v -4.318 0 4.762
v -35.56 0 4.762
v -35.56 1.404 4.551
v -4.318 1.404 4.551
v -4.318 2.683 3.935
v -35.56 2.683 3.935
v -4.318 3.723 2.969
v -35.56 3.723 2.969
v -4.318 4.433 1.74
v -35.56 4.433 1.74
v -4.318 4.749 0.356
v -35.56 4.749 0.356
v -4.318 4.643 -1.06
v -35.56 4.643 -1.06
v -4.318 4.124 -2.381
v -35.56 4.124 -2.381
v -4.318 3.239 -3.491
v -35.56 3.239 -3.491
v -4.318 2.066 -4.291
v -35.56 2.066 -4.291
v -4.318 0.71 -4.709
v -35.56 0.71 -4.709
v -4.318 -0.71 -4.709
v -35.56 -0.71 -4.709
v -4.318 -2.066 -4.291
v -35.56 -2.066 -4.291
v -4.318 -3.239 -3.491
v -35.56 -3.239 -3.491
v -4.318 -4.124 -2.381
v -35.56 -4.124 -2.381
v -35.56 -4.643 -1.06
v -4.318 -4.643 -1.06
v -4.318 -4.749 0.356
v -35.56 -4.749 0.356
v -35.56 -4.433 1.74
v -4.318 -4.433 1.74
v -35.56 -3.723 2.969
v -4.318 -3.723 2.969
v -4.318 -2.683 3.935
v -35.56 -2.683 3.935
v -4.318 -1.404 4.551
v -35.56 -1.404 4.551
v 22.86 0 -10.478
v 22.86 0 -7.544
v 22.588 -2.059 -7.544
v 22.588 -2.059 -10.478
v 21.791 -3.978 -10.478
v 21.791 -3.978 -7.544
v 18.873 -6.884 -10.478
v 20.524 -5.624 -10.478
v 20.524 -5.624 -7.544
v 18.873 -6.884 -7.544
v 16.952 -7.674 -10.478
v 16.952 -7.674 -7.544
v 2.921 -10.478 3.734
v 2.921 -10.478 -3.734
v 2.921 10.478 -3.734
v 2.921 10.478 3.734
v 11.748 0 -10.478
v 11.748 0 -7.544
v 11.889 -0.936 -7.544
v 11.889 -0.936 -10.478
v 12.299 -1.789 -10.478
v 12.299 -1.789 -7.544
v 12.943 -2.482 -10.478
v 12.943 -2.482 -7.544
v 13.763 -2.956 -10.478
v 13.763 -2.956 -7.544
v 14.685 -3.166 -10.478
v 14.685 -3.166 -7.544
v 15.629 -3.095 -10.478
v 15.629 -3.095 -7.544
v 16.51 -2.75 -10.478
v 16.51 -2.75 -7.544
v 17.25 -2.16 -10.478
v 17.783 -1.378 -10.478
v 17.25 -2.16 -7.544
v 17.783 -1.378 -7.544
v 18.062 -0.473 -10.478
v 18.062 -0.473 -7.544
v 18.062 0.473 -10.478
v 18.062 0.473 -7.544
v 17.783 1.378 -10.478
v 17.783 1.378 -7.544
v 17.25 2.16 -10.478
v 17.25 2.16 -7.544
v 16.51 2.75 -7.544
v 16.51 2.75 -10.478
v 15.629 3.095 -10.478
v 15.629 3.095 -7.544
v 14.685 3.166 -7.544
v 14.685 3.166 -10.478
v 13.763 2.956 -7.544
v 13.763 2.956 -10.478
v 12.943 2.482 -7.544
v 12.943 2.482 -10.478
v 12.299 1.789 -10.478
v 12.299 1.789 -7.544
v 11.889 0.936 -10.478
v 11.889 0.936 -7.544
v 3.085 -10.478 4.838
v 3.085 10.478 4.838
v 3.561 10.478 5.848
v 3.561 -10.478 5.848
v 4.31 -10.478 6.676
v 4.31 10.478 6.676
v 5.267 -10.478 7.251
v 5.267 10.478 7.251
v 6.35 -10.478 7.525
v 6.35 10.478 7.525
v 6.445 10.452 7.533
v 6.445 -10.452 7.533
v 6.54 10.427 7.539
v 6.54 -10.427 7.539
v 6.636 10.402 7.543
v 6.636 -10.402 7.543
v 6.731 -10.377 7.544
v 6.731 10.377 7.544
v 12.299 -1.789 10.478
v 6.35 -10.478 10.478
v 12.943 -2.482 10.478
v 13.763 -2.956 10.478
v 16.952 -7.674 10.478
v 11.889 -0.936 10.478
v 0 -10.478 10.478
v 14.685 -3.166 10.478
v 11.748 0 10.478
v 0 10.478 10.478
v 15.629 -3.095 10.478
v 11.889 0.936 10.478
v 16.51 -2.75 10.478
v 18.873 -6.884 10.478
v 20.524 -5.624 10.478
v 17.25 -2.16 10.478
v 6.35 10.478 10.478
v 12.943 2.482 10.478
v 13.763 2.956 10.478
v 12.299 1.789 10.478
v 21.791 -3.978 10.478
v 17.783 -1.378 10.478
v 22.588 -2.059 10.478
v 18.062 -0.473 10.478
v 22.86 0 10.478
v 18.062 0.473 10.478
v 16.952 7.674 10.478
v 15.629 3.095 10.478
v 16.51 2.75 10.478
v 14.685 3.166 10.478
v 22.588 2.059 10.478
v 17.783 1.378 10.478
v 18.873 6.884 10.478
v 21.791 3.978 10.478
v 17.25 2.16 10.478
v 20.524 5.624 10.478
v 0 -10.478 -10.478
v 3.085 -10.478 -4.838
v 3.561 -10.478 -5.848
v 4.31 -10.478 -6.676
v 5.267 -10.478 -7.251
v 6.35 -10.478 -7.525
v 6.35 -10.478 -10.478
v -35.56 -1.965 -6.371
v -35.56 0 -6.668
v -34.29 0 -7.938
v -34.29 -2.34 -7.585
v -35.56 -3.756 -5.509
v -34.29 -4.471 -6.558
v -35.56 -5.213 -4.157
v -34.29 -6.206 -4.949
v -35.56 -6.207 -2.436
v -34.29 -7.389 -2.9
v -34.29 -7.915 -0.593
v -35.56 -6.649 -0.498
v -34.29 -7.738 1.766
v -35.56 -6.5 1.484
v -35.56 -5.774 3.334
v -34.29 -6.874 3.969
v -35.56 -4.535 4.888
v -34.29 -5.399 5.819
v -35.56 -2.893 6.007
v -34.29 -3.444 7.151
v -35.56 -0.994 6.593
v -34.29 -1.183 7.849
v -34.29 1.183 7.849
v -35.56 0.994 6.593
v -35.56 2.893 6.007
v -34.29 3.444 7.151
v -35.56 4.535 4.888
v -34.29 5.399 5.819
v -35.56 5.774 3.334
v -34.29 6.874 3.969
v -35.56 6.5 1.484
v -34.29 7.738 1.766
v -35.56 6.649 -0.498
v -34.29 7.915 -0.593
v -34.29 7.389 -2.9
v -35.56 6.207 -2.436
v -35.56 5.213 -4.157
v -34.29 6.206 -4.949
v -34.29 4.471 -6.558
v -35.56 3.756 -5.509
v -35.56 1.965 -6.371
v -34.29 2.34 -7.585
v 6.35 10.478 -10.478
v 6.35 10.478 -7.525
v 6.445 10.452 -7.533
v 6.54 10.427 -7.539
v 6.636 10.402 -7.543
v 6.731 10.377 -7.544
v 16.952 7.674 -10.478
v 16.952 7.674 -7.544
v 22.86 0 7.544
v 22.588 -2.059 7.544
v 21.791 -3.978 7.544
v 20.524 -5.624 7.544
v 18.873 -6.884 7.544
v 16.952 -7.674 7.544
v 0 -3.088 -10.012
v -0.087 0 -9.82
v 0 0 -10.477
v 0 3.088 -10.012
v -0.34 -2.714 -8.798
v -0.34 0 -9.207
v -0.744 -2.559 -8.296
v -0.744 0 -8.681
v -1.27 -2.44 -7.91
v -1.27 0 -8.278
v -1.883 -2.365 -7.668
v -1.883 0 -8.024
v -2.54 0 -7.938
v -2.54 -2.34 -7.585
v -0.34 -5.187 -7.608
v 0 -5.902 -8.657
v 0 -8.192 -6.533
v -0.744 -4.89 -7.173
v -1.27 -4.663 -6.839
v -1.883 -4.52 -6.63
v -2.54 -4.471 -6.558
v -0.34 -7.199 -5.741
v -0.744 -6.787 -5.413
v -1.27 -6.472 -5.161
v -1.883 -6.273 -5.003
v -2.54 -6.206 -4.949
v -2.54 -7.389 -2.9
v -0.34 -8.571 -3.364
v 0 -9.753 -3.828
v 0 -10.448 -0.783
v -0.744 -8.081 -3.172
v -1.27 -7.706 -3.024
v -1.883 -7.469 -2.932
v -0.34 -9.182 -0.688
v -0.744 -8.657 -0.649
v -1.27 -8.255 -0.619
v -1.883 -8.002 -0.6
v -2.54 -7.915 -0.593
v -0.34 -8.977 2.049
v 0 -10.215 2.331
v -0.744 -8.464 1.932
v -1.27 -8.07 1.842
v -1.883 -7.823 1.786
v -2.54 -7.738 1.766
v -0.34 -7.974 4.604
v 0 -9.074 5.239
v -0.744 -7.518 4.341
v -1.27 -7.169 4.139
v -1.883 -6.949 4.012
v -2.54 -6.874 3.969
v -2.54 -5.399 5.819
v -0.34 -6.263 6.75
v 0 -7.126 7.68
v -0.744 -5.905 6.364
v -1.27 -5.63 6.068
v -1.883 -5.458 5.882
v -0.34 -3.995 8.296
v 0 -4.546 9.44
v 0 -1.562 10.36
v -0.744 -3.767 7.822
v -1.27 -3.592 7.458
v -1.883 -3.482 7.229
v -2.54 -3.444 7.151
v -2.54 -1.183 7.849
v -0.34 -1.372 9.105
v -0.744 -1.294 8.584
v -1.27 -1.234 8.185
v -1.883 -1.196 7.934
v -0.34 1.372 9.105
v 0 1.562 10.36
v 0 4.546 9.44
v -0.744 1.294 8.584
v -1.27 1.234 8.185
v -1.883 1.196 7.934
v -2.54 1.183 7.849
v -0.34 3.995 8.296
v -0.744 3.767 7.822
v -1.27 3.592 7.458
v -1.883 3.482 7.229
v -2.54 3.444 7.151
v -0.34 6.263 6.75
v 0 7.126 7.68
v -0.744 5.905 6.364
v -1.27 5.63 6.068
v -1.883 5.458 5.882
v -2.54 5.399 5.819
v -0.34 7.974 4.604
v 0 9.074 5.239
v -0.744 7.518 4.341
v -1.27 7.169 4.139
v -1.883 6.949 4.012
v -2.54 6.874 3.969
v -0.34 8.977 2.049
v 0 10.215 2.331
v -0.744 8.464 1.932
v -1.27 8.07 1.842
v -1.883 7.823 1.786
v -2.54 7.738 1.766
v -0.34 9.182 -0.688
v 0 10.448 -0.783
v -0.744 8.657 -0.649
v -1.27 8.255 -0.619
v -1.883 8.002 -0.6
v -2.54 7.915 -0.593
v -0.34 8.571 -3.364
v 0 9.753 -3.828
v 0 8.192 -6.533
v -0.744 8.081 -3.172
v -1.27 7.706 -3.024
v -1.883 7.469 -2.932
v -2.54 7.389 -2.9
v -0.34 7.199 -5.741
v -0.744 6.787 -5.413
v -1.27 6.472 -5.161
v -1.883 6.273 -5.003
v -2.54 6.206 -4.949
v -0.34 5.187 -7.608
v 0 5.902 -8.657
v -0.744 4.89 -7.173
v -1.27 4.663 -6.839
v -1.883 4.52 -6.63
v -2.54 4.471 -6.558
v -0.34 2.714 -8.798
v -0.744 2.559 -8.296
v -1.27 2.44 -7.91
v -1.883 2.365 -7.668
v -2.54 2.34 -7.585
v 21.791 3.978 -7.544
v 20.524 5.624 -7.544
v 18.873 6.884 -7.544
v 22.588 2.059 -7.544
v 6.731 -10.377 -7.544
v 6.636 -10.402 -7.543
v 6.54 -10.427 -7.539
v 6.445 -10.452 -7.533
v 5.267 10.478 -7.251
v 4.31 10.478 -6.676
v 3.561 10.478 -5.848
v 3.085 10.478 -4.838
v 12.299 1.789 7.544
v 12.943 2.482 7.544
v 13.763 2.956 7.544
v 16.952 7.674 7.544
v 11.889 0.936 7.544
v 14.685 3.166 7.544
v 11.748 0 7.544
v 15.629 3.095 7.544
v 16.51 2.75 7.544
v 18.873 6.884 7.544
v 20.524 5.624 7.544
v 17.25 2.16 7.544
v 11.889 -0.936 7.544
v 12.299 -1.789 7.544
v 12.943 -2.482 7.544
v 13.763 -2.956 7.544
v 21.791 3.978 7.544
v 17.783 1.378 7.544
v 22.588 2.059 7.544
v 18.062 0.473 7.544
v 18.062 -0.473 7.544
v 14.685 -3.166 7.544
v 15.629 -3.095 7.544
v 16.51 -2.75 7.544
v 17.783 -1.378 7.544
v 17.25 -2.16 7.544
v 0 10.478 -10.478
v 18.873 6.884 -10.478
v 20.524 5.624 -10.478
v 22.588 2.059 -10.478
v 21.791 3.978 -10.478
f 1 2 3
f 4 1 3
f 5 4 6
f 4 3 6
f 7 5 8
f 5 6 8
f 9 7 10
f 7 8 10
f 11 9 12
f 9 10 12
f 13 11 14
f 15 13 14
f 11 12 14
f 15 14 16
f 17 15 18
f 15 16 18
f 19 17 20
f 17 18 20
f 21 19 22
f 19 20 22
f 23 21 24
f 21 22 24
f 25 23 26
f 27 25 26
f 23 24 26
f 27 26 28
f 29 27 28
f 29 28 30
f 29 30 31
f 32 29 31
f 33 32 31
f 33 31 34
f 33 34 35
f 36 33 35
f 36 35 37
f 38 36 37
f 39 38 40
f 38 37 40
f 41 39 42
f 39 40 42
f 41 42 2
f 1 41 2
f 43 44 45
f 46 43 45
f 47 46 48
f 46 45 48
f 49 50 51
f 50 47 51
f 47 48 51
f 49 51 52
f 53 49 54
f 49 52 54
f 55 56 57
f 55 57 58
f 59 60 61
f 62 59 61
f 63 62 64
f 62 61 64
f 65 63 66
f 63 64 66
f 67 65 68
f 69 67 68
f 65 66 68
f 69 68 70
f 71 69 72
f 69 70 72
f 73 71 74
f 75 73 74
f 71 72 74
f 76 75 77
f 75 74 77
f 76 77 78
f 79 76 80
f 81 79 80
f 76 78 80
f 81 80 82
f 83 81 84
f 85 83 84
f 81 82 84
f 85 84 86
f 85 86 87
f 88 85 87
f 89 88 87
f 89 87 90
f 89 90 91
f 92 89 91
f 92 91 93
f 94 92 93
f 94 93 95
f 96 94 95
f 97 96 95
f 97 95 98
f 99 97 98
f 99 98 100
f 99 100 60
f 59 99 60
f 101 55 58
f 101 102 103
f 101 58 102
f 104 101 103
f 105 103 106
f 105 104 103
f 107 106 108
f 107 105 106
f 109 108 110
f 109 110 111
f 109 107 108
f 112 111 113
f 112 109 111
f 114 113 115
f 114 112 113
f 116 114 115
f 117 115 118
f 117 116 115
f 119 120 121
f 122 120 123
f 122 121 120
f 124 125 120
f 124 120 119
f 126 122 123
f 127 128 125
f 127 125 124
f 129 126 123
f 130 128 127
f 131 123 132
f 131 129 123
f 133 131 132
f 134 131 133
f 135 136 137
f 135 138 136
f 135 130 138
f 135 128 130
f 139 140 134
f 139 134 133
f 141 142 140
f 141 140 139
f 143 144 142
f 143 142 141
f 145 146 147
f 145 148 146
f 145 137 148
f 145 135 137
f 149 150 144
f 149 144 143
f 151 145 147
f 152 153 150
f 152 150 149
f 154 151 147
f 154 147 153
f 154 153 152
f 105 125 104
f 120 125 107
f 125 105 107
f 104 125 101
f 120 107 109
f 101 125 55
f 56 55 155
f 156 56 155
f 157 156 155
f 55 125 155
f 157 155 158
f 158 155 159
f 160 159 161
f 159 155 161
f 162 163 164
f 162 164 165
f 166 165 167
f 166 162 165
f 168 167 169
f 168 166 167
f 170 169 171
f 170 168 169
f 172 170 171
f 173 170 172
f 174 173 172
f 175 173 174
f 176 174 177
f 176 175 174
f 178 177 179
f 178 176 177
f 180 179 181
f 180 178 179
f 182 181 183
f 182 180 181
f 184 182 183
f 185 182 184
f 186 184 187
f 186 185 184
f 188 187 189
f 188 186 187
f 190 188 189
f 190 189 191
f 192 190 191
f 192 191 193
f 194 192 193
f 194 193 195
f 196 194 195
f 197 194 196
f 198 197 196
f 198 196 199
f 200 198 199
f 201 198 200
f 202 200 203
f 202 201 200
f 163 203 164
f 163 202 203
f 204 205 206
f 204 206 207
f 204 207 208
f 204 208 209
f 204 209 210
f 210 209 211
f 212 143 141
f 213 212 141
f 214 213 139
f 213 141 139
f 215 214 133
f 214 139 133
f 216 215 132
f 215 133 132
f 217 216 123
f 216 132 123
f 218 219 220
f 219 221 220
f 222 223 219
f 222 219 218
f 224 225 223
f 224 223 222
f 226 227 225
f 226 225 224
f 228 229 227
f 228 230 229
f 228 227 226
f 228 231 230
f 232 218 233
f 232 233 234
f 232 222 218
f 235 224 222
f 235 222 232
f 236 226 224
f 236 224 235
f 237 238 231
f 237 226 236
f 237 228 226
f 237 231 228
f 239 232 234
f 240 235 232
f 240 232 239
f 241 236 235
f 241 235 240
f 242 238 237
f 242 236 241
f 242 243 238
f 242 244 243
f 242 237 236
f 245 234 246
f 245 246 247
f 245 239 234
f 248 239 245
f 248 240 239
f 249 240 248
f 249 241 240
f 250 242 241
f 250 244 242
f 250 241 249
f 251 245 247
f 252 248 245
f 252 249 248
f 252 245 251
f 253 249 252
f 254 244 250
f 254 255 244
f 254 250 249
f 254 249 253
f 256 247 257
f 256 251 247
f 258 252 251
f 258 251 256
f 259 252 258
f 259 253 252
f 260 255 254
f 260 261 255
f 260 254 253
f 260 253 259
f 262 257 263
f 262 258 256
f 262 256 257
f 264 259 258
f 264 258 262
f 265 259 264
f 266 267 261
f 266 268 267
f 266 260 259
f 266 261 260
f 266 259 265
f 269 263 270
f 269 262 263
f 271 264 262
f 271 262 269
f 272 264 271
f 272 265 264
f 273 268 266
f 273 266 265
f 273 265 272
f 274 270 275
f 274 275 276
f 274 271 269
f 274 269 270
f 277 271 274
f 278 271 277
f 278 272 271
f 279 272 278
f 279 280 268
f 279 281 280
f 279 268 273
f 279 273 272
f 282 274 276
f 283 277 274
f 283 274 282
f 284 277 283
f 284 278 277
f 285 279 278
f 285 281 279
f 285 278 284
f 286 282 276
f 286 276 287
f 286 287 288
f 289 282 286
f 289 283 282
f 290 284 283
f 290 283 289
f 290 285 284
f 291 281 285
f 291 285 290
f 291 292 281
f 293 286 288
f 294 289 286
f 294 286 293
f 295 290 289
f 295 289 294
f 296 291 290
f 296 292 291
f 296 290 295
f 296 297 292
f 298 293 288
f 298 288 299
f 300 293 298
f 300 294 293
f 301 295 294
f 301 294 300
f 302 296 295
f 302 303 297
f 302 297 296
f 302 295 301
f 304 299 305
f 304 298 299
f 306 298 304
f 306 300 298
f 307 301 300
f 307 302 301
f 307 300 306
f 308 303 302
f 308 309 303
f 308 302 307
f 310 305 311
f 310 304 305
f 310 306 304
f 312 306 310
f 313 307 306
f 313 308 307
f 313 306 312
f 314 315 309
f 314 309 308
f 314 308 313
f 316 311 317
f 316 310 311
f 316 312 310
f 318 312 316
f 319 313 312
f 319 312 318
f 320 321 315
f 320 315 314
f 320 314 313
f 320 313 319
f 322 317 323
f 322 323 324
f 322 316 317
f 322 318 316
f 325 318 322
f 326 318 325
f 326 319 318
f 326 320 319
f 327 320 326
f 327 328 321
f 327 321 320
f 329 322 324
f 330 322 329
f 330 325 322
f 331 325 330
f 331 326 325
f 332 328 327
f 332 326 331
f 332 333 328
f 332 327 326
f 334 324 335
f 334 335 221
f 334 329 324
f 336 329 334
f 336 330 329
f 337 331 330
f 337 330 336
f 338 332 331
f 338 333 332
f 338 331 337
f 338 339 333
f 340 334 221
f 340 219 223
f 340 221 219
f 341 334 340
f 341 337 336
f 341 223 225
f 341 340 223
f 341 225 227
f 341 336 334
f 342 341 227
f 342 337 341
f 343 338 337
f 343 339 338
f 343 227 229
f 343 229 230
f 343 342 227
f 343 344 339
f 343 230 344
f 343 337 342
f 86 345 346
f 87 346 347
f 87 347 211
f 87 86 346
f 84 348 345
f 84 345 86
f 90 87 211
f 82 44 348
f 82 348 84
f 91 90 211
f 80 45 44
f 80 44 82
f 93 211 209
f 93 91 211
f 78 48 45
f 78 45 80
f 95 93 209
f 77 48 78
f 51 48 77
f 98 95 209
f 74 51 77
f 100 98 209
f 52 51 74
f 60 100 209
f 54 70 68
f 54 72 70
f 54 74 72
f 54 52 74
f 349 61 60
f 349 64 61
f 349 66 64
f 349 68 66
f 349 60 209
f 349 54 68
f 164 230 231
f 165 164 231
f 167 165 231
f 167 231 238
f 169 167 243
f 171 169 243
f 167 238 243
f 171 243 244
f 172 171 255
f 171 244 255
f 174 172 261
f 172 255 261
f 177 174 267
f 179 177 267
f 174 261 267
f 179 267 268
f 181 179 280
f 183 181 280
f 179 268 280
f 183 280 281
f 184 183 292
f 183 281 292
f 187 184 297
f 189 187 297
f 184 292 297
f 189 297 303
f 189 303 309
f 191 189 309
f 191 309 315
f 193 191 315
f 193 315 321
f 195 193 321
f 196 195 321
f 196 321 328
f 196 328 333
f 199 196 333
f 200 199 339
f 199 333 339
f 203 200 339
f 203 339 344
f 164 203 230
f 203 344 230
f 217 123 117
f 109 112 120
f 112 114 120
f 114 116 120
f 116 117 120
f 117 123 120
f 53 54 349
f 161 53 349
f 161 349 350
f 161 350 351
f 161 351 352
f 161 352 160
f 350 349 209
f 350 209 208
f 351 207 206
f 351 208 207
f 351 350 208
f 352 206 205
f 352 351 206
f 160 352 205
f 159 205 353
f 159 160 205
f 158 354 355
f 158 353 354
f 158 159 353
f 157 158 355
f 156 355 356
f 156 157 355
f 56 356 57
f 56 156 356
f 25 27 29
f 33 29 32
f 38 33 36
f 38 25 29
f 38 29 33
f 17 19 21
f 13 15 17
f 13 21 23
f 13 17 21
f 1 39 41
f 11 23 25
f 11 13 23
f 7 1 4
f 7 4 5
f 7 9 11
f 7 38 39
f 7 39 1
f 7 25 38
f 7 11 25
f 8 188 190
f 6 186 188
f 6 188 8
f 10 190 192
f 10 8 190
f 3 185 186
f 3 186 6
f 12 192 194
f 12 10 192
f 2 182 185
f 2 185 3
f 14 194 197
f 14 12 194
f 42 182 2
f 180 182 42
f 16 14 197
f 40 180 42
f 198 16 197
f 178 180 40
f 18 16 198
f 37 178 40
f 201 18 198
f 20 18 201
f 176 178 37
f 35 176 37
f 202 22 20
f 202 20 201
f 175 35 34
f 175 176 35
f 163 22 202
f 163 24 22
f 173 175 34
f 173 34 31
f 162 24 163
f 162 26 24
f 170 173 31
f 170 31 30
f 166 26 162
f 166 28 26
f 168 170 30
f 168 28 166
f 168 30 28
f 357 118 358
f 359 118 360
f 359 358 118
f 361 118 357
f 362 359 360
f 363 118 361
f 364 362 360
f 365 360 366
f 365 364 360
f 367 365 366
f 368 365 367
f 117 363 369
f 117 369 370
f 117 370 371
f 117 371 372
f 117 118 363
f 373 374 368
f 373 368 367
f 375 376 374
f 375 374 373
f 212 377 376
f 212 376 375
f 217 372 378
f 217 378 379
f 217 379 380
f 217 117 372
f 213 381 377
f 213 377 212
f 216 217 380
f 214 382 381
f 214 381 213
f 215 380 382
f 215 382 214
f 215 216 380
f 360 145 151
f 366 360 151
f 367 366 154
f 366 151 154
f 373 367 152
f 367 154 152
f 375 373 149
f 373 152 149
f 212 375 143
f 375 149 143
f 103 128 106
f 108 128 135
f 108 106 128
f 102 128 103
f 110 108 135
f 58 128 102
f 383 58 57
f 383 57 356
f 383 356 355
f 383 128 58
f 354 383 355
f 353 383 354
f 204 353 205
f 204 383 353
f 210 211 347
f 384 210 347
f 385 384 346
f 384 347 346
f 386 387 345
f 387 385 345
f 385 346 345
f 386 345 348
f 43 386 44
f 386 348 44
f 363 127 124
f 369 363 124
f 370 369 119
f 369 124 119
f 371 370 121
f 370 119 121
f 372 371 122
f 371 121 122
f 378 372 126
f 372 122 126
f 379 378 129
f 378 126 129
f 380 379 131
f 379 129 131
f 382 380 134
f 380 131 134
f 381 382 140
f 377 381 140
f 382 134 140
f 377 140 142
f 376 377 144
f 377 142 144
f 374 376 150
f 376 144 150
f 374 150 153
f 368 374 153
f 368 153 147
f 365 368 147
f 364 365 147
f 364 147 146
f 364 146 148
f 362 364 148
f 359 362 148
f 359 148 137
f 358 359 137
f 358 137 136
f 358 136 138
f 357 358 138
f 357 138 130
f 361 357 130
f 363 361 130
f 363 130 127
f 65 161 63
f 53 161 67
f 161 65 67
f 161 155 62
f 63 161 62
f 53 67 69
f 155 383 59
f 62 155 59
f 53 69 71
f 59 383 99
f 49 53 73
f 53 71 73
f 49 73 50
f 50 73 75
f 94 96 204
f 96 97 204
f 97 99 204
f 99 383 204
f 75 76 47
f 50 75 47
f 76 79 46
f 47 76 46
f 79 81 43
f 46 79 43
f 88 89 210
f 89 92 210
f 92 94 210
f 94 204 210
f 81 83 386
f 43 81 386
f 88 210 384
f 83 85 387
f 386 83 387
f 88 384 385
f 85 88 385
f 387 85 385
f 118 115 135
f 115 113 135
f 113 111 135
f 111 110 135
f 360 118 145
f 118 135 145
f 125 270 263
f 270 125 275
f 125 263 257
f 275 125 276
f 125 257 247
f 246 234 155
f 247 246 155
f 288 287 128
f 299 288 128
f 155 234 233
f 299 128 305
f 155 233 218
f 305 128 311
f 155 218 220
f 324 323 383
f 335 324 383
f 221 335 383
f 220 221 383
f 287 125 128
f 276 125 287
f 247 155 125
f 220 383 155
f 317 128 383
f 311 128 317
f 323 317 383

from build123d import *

# Parameters (mm, degrees)
SKETCH1_W               = 22.86
SKETCH1_H               = 20.955
BOSS_EXTRUDE1_DEPTH     = 10.4775
CUT_EXTRUDE1_DEPTH      = 33.733310729
CUT_EXTRUDE1_DEPTH_BACK = 33.733310729
CUT_EXTRUDE2_DEPTH      = 33.733310729
SKETCH4_R               = 7.9375
BOSS_EXTRUDE2_DEPTH     = 35.56
SKETCH5_R               = 4.7625
CUT_EXTRUDE3_DEPTH      = 31.242
FILLET1_R               = 2.54
CHAMFER1_SIZE           = 1.27


with BuildPart() as part:
    # Sketch1 → Boss-Extrude1 (new, symmetric)
    with BuildSketch(Plane(origin=(0, 0, 0), x_dir=(1, 0, 0), z_dir=(0, 1, 0))):
        with Locations((11.43, 0)):
            Rectangle(SKETCH1_W, SKETCH1_H)
    extrude(amount=BOSS_EXTRUDE1_DEPTH, both=True)

    # Sketch2 → Cut-Extrude1 (cut, two sides: drawn at the far end of the back side and taken through both)
    with BuildSketch(Plane(origin=(0, 10.4775, 0), x_dir=(1, 0, 0), z_dir=(0, 1, 0)).offset(-CUT_EXTRUDE1_DEPTH_BACK)):
        with BuildLine():
            Line((2.921, 3.7338), (2.921, -3.7338))
            ThreePointArc((2.921, -3.7338), (4.036923164, -6.427876836), (6.731, -7.5438))
            Line((6.731, -7.5438), (22.86, -7.5438))
            Line((22.86, -7.5438), (22.86, 7.5438))
            Line((22.86, 7.5438), (6.731, 7.5438))
            ThreePointArc((6.731, 7.5438), (4.036923164, 6.427876836), (2.921, 3.7338))
        make_face()
    extrude(amount=CUT_EXTRUDE1_DEPTH + CUT_EXTRUDE1_DEPTH_BACK, mode=Mode.SUBTRACT)

    # Sketch3 → Cut-Extrude2 (cut, through all)
    with BuildSketch(Plane.XY.offset(10.4775)):
        with BuildLine():
            ThreePointArc((16.951908562, 7.673682763), (21.211869472, 4.842286433), (22.86, 0))
            Line((22.86, 0), (22.86, 10.4775))
            Line((22.86, 10.4775), (6.35, 10.4775))
            Line((6.35, 10.4775), (16.951908562, 7.673682763))
        make_face()
        with BuildLine():
            Line((22.86, -10.4775), (22.86, 0))
            ThreePointArc((22.86, 0), (21.211869472, -4.842286433), (16.951908562, -7.673682763))
            Line((16.951908562, -7.673682763), (6.35, -10.4775))
            Line((6.35, -10.4775), (22.86, -10.4775))
        make_face()
        with BuildLine():
            ThreePointArc((18.0975, 0), (14.9225, 3.175), (11.7475, 0))
            Line((11.7475, 0), (18.0975, 0))
        make_face()
        with BuildLine():
            Line((18.0975, 0), (11.7475, 0))
            ThreePointArc((11.7475, 0), (14.9225, -3.175), (18.0975, 0))
        make_face()
    extrude(amount=-CUT_EXTRUDE2_DEPTH, mode=Mode.SUBTRACT)

    # Sketch4 → Boss-Extrude2 (add)
    with BuildSketch(Plane.ZY):
        with Locations(Location((0, 0, 0), (0, 0, 180))):
            Circle(SKETCH4_R)
    extrude(amount=BOSS_EXTRUDE2_DEPTH)

    # Sketch5 → Cut-Extrude3 (cut)
    with BuildSketch(Plane.ZY.offset(35.56)):
        Circle(SKETCH5_R)
    extrude(amount=-CUT_EXTRUDE3_DEPTH, mode=Mode.SUBTRACT)

    # Fillet1
    fillet1_edges = [part.edges().sort_by_distance(p)[0] for p in [
        (0, 0, 7.9375),
    ]]
    fillet(fillet1_edges, radius=FILLET1_R - 0.0001)  # a hair under: the kernel refuses the full size

    # Chamfer1
    chamfer1_edges = [part.edges().sort_by_distance(p)[0] for p in [
        (-35.56, 0, 7.9375),
    ]]
    chamfer(chamfer1_edges, length=CHAMFER1_SIZE)


solid = part.part
